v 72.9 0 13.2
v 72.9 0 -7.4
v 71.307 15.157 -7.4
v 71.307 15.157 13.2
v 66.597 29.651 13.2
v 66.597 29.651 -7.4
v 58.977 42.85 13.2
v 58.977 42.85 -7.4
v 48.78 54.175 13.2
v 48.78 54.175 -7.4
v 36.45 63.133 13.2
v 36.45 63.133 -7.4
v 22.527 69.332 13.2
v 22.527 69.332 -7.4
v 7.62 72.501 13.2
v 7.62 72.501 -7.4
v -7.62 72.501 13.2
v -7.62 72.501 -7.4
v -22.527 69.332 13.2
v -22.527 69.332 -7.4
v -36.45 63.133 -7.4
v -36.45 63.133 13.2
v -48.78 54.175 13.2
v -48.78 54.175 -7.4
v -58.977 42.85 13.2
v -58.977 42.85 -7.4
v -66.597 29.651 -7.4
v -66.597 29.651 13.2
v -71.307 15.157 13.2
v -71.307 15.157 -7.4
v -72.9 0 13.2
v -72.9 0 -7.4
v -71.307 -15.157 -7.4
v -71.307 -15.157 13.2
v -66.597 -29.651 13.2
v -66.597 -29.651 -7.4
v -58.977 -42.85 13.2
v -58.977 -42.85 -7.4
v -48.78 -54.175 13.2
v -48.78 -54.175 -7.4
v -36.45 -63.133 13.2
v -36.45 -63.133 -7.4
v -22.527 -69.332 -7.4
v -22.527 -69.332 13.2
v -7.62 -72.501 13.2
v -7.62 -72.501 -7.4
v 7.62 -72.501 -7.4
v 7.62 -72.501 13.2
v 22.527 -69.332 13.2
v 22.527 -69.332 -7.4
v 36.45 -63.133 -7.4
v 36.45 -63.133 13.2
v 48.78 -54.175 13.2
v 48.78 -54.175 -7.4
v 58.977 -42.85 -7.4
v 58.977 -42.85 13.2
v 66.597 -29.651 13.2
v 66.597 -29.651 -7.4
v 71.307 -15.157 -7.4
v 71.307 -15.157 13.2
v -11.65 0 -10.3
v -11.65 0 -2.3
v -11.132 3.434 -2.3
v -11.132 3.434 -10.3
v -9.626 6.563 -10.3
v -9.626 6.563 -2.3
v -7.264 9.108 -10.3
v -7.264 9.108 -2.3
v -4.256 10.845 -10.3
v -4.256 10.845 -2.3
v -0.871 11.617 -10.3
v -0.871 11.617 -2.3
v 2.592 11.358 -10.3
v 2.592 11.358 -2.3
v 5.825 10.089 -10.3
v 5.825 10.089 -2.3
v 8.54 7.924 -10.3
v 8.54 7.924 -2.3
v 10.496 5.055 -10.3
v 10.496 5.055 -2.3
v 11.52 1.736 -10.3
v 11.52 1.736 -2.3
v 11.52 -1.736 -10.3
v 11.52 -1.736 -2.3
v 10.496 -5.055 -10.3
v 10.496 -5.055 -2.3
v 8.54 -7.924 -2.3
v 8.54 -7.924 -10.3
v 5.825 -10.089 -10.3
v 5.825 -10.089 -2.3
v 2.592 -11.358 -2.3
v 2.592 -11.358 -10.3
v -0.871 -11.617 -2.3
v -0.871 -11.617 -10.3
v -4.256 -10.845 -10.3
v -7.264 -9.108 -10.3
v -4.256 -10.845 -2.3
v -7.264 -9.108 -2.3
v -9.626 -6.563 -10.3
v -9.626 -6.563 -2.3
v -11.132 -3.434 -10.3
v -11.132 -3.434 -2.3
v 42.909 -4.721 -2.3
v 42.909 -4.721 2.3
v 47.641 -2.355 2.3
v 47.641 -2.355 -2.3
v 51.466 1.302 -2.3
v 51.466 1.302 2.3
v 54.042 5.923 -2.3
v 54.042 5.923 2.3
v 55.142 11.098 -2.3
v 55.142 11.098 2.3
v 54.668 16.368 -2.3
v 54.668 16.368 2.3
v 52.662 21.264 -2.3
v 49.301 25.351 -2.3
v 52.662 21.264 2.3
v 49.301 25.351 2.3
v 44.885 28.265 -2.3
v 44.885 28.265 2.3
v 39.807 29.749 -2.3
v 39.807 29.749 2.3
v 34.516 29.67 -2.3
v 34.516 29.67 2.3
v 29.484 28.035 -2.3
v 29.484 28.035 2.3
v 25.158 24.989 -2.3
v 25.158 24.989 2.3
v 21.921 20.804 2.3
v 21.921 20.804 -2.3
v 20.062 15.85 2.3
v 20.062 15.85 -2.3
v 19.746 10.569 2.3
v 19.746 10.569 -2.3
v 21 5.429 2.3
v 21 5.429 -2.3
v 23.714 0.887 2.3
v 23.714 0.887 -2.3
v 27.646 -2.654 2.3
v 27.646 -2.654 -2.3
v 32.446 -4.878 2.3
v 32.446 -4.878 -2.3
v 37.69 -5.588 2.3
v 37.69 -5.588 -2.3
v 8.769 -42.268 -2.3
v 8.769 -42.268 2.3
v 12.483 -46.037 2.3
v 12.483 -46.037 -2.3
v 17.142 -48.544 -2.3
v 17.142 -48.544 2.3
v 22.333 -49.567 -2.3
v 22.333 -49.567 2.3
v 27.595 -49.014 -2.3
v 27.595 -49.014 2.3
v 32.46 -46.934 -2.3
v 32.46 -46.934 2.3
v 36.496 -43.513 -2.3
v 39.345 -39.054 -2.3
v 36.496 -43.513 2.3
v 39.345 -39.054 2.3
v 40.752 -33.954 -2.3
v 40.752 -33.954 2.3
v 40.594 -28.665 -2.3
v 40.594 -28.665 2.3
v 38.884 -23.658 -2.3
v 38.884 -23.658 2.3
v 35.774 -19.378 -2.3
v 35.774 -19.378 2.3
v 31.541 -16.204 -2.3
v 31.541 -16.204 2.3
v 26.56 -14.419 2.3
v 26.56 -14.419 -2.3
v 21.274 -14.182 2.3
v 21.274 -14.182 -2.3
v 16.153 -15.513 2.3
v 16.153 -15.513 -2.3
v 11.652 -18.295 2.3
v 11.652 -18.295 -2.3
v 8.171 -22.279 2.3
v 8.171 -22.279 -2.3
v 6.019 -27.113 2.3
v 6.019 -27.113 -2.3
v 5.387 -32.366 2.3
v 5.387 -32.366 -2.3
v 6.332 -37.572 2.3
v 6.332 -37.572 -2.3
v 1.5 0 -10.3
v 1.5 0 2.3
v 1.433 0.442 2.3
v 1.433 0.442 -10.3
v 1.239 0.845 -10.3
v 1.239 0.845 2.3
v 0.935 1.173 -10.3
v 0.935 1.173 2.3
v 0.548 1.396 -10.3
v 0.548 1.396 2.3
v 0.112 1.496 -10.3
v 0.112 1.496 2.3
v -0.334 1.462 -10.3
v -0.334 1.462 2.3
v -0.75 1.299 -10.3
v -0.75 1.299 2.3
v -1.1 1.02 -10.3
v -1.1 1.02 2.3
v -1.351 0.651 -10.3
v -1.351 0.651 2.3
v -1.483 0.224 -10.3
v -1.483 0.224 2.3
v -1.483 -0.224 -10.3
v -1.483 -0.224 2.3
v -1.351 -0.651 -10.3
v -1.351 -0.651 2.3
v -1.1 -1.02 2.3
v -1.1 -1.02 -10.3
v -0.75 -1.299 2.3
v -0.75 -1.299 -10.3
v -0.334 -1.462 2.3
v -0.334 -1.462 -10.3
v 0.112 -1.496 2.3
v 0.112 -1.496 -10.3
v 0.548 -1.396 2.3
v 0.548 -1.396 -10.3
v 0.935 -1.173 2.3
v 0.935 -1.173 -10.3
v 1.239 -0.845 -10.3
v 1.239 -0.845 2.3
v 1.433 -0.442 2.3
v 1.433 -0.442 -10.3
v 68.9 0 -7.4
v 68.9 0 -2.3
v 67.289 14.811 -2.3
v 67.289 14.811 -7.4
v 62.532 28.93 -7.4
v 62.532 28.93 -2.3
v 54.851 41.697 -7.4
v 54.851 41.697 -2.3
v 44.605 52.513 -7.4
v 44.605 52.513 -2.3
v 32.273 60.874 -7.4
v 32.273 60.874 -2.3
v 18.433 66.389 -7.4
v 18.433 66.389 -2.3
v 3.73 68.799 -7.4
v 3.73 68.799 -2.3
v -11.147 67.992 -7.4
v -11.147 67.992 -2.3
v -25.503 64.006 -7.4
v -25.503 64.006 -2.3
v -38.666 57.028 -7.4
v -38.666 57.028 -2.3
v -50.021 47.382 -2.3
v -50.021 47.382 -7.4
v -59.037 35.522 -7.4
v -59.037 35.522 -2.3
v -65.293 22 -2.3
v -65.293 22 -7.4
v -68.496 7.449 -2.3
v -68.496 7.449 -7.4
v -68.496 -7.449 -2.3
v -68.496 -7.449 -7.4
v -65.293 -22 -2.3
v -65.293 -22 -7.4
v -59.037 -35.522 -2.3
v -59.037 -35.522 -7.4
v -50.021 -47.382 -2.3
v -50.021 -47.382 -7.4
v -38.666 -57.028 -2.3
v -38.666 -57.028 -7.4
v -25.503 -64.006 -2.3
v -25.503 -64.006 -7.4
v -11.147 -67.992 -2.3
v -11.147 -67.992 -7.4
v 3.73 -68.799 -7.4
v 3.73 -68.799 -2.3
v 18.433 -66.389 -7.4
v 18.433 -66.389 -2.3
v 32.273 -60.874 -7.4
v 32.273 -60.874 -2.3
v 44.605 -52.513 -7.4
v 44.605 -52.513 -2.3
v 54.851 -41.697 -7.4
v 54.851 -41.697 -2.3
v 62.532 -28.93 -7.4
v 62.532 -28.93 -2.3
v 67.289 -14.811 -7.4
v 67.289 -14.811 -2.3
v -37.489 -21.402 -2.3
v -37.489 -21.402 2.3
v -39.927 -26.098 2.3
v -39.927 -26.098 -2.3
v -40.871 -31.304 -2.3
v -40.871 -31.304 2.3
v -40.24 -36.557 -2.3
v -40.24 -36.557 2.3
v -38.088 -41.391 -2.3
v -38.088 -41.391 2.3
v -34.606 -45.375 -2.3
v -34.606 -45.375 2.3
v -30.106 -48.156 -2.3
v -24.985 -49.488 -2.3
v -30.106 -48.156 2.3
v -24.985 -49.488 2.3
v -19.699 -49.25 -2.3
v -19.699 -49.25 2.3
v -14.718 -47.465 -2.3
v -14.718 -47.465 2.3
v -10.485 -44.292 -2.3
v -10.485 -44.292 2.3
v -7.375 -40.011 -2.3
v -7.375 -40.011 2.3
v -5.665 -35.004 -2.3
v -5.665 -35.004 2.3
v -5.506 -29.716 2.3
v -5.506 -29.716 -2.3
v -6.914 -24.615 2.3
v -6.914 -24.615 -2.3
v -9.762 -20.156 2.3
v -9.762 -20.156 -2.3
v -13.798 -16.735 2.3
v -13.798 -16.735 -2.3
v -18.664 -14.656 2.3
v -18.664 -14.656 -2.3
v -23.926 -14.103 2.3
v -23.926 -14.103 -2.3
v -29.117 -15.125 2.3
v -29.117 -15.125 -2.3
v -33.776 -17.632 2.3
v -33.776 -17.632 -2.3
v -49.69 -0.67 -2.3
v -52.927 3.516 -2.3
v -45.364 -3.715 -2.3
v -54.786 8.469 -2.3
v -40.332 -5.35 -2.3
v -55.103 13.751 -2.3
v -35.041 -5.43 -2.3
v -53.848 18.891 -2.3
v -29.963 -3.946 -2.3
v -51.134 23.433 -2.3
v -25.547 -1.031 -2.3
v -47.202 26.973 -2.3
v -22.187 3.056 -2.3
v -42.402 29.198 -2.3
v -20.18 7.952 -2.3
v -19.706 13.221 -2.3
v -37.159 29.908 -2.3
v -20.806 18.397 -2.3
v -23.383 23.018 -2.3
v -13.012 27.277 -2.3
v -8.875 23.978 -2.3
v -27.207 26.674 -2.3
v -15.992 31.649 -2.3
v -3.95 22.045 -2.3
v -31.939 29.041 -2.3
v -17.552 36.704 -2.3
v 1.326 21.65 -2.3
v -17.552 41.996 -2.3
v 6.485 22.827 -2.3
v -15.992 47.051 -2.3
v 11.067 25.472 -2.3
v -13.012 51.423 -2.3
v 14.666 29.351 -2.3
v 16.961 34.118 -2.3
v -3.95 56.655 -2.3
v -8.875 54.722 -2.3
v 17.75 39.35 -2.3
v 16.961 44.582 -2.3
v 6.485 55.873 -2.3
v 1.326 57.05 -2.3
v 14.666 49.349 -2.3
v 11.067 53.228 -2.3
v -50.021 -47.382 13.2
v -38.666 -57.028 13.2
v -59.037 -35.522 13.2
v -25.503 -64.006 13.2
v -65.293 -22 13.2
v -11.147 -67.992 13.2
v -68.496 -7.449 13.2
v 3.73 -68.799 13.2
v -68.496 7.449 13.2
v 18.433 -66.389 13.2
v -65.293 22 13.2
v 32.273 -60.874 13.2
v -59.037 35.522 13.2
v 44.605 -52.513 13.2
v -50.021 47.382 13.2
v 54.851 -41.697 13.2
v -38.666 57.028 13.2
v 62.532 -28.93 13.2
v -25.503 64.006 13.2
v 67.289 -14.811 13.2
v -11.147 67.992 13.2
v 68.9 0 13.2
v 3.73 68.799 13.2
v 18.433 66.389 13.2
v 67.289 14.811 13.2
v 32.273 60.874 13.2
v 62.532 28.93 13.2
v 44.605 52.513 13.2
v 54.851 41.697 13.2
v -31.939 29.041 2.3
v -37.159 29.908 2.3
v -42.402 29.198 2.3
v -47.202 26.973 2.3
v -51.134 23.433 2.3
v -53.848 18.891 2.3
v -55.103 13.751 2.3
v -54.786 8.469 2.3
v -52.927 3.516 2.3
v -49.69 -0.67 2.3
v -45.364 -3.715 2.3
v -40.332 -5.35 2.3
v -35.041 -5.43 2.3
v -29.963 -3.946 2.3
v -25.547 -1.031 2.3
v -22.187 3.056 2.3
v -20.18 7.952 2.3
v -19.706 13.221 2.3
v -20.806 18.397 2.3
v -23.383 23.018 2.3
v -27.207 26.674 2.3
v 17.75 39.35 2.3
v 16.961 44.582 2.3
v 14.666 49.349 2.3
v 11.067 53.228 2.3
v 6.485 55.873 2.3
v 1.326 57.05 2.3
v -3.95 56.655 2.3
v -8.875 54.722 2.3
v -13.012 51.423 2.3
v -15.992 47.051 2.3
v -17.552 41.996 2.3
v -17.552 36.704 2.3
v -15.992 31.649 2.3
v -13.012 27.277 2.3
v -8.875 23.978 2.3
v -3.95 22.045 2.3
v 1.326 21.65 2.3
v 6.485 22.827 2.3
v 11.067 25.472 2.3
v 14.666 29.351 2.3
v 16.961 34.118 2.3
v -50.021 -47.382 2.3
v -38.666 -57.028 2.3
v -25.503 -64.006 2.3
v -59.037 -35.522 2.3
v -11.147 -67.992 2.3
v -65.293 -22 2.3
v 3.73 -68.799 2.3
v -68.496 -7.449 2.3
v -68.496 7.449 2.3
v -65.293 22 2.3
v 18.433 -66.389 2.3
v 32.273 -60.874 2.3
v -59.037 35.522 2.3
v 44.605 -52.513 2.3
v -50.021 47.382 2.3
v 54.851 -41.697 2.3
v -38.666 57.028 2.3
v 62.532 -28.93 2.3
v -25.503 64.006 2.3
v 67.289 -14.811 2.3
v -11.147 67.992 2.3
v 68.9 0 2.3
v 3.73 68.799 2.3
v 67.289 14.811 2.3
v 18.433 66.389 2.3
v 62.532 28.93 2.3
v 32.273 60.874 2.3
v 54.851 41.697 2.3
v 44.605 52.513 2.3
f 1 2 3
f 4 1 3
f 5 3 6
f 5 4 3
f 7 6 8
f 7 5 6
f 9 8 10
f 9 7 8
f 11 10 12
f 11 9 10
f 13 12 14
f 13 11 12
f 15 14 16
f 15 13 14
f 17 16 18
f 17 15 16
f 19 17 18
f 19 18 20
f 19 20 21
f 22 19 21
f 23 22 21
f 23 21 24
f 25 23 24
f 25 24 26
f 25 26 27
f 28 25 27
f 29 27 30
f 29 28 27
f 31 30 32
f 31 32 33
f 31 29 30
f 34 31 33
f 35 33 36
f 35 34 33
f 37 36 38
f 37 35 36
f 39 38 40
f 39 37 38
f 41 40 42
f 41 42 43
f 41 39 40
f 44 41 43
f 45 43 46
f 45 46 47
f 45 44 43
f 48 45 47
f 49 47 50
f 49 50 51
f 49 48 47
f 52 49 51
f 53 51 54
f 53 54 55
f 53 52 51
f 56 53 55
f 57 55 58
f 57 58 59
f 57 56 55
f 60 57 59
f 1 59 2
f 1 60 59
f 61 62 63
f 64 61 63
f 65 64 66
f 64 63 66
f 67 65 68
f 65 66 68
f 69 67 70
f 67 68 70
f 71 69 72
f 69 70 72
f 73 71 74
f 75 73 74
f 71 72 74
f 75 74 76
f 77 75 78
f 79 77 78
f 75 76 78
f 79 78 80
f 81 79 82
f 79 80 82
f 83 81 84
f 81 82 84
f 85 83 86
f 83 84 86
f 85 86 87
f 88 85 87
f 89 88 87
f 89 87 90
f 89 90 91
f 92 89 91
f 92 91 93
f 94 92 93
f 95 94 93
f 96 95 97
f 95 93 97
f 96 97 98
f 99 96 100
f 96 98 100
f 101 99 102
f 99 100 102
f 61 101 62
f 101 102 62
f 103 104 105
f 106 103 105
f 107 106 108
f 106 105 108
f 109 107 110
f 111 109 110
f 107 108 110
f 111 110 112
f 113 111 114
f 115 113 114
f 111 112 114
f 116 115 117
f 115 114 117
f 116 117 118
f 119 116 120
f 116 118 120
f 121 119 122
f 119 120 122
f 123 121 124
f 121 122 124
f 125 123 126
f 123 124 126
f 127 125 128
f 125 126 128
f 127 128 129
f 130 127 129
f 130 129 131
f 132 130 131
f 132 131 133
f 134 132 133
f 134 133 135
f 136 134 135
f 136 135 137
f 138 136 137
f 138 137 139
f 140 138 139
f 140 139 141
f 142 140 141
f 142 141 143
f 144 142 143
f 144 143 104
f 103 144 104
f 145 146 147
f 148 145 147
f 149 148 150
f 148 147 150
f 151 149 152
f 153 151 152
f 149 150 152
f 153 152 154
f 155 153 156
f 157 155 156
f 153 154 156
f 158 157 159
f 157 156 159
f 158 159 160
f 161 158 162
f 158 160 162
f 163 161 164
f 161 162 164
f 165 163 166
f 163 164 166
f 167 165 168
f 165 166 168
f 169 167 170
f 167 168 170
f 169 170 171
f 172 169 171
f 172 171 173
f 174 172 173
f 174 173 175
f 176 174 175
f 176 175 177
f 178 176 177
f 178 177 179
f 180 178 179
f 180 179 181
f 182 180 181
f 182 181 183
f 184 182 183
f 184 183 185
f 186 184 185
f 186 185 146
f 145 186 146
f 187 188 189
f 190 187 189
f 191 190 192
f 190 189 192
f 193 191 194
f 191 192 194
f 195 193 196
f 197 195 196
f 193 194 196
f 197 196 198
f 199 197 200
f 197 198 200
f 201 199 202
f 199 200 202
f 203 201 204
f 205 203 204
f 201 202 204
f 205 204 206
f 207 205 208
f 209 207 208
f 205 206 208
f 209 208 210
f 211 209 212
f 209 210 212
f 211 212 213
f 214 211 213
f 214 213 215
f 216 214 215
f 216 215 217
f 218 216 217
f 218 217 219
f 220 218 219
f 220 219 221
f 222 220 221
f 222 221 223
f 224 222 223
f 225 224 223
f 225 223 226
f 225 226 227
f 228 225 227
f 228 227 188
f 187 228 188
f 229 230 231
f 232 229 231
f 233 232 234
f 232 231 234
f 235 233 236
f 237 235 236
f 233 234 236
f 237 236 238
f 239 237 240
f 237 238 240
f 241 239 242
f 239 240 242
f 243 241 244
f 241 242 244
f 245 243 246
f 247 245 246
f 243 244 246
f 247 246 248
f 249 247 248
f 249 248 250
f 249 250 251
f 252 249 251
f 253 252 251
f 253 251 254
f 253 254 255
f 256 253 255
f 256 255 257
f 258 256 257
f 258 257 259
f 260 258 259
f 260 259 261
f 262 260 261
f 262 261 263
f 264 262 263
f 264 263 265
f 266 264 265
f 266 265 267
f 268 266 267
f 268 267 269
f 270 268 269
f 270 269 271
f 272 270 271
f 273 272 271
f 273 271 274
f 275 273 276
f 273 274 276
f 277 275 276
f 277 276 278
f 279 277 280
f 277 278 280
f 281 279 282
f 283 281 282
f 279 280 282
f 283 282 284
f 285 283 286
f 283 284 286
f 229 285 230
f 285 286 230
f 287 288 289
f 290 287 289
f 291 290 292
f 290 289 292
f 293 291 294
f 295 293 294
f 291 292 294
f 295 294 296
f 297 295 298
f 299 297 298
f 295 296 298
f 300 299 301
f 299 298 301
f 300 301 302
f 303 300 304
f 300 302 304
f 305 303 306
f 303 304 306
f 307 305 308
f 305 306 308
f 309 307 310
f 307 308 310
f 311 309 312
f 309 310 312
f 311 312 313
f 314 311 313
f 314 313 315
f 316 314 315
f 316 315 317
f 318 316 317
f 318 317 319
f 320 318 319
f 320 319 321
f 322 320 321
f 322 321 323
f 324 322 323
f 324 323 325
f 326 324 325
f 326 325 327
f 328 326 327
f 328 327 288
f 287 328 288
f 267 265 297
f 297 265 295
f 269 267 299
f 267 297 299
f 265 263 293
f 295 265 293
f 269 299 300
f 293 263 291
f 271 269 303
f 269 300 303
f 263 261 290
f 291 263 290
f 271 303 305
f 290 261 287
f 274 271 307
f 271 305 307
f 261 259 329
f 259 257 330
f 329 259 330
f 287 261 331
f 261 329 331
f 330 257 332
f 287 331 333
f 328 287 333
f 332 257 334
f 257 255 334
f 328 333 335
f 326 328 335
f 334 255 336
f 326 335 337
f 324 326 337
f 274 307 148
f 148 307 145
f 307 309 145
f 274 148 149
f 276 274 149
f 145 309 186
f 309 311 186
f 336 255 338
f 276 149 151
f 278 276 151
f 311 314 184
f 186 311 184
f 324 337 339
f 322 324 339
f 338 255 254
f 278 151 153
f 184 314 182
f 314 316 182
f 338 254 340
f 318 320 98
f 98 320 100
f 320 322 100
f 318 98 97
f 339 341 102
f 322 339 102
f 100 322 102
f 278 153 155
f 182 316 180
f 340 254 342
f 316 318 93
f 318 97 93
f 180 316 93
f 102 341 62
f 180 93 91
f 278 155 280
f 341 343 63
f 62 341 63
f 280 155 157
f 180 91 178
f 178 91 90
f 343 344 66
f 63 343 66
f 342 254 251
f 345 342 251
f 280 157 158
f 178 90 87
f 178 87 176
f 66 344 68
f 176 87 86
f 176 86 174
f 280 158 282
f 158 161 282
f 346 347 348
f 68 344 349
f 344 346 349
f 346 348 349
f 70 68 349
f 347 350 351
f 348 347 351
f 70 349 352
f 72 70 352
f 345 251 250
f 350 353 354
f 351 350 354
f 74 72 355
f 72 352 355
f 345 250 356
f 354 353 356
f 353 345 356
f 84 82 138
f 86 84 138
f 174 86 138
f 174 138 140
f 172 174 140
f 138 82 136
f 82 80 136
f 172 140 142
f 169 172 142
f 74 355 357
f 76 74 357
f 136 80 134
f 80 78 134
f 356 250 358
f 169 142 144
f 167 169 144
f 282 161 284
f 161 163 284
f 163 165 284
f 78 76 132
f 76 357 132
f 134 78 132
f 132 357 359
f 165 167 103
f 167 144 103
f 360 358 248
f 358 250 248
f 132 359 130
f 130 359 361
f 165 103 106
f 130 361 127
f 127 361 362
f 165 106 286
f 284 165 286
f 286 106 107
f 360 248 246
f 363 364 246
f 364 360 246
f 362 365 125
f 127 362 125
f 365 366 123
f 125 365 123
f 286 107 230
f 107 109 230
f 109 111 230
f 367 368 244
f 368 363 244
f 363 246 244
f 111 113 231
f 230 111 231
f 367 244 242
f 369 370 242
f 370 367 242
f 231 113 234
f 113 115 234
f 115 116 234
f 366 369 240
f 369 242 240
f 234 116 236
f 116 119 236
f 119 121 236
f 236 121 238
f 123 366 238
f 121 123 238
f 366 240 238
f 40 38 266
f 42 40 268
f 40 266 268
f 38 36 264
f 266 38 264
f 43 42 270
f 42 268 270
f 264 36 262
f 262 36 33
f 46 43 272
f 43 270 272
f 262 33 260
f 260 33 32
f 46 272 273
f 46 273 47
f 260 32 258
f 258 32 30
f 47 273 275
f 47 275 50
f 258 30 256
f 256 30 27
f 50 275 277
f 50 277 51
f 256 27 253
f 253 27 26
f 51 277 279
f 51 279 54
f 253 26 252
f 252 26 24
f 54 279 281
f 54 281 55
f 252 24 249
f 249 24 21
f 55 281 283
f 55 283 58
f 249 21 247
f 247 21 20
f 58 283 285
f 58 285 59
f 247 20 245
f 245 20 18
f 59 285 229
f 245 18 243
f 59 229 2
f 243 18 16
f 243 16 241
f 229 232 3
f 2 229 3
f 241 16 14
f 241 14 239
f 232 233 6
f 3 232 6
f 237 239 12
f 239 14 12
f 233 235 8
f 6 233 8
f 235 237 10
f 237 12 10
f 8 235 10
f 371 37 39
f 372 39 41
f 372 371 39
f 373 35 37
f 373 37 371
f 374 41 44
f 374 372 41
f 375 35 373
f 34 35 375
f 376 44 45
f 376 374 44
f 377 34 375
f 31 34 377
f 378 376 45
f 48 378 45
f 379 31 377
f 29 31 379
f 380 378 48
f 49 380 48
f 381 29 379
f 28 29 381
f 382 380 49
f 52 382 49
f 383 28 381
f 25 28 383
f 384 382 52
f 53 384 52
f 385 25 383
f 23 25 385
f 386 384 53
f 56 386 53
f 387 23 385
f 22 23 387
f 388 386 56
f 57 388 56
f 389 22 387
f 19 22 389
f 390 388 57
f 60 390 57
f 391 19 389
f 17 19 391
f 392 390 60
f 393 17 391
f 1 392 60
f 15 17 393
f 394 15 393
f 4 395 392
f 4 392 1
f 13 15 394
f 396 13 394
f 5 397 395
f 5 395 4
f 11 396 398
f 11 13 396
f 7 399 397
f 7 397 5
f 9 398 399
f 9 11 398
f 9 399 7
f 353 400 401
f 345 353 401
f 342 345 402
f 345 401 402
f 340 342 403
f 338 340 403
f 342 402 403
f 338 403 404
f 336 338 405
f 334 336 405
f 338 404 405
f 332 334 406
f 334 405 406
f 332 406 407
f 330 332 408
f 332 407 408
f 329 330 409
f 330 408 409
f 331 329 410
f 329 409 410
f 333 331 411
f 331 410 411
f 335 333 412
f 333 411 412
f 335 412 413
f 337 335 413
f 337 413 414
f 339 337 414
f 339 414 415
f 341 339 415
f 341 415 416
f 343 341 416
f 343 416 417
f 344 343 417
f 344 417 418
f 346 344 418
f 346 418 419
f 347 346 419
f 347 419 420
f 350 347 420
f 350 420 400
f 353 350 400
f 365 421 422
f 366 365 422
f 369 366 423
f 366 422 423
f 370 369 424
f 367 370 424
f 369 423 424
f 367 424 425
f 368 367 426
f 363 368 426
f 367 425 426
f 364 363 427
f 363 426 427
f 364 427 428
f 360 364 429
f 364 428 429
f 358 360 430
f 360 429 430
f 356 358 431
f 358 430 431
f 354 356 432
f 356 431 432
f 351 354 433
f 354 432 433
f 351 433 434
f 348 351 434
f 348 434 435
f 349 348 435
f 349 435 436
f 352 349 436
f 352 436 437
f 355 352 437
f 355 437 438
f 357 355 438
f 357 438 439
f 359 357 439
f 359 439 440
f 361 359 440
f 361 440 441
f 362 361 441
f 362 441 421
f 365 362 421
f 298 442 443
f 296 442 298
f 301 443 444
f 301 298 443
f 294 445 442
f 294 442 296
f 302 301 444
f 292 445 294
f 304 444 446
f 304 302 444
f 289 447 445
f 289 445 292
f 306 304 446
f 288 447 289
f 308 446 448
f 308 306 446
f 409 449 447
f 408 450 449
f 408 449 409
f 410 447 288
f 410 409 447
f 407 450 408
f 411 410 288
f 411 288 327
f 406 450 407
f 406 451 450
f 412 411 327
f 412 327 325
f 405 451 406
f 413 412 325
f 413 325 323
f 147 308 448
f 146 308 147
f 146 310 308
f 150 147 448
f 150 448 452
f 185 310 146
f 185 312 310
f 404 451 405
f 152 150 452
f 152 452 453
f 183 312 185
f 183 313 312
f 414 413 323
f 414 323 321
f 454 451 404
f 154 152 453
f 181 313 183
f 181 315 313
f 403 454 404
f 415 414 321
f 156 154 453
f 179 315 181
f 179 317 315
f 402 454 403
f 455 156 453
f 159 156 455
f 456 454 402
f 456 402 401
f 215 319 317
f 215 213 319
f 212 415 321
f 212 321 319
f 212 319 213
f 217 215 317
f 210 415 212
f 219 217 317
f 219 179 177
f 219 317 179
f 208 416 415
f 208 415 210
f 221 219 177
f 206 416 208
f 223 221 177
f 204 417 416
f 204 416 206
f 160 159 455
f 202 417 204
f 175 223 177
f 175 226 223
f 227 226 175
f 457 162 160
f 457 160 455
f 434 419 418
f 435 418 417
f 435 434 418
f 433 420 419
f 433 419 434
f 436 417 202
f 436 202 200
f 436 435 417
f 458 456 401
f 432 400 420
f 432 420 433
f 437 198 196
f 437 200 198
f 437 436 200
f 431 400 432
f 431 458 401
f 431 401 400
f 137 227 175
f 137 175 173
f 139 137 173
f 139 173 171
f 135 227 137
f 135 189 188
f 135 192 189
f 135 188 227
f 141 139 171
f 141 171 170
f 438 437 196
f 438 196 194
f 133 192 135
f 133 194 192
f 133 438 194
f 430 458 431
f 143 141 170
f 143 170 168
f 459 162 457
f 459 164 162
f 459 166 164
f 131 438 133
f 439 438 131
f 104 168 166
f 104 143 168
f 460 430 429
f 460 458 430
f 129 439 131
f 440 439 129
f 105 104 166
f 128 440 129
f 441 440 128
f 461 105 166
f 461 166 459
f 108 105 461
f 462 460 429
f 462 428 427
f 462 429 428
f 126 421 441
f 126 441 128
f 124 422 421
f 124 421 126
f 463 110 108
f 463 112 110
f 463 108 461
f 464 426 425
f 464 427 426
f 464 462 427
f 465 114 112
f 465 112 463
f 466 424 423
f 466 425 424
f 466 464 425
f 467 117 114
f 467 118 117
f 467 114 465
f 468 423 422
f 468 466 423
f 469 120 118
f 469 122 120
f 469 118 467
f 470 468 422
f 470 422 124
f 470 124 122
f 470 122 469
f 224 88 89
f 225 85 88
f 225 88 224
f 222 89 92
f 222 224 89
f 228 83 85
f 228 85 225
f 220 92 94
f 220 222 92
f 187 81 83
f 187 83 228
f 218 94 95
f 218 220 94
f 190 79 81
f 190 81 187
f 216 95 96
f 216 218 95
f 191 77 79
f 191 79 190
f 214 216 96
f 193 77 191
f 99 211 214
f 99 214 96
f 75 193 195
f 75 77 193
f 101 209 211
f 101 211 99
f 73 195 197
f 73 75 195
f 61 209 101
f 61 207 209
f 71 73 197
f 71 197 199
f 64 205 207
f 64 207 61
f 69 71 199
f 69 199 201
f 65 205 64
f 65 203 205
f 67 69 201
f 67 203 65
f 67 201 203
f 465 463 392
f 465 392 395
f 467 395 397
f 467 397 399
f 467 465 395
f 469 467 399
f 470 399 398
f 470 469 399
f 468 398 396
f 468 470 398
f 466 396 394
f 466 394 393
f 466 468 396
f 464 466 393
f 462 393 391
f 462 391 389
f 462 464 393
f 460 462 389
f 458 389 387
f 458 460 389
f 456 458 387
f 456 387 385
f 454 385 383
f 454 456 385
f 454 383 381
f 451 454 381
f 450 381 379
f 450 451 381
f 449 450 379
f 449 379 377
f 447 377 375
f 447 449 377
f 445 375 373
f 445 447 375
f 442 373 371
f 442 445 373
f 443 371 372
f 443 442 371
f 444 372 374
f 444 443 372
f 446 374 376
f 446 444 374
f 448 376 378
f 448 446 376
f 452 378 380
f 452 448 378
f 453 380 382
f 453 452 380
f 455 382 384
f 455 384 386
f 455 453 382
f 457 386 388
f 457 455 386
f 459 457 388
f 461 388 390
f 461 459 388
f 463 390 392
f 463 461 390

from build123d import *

# Parameters (mm, degrees)
SKETCH1_R                = 68.9
BOSS_EXTRUDE1_DEPTH      = 2.3
SKETCH2_R                = 17.75
CUT_EXTRUDE1_DEPTH       = 98.54783442
CIRPATTERN1_COUNT        = 5
BOSS_EXTRUDE2_DEPTH      = 10.9
BOSS_EXTRUDE2_DEPTH_BACK = 9.7
SKETCH3_R                = 72.9
SKETCH3_R_2              = 68.9
SKETCH4_R                = 11.65
BOSS_EXTRUDE3_DEPTH      = 8
SKETCH6_R                = 1.5
CUT_EXTRUDE2_DEPTH       = 104.863275512


with BuildPart() as part:
    # Sketch1 → Boss-Extrude1 (new, symmetric)
    with BuildSketch(Plane.XY):
        Circle(SKETCH1_R)
    extrude(amount=BOSS_EXTRUDE1_DEPTH, both=True)

    # Sketch2 → Cut-Extrude1 (cut, through all)
    with BuildSketch(Plane.XY.offset(2.3)):
        with Locations((0, 39.35)):
            Circle(SKETCH2_R)
    cut_extrude1 = extrude(amount=-CUT_EXTRUDE1_DEPTH, mode=Mode.SUBTRACT)

    # CirPattern1: Cut-Extrude1 ×5 about axis
    cirpattern1_axis = Axis((0, 0, -88.99), (0, 0, 1))
    for i in range(1, CIRPATTERN1_COUNT):
        add(cut_extrude1.rotate(cirpattern1_axis, i * 360 / CIRPATTERN1_COUNT), mode=Mode.SUBTRACT)

    # Sketch3 → Boss-Extrude2 (add, two sides: drawn at the far end of the back side and taken through both)
    with BuildSketch(Plane.XY.offset(2.3).offset(-BOSS_EXTRUDE2_DEPTH_BACK)):
        Circle(SKETCH3_R)
        Circle(SKETCH3_R_2, mode=Mode.SUBTRACT)
    extrude(amount=BOSS_EXTRUDE2_DEPTH + BOSS_EXTRUDE2_DEPTH_BACK)

    # Sketch4 → Boss-Extrude3 (add)
    with BuildSketch(Plane(origin=(0, 0, -2.3), x_dir=(-1, 0, 0), z_dir=(0, 0, -1))):
        Circle(SKETCH4_R)
    extrude(amount=BOSS_EXTRUDE3_DEPTH)

    # Sketch6 → Cut-Extrude2 (cut, through all)
    with BuildSketch(Plane.XY.offset(2.3)):
        Circle(SKETCH6_R)
    extrude(amount=-CUT_EXTRUDE2_DEPTH, mode=Mode.SUBTRACT)


solid = part.part
